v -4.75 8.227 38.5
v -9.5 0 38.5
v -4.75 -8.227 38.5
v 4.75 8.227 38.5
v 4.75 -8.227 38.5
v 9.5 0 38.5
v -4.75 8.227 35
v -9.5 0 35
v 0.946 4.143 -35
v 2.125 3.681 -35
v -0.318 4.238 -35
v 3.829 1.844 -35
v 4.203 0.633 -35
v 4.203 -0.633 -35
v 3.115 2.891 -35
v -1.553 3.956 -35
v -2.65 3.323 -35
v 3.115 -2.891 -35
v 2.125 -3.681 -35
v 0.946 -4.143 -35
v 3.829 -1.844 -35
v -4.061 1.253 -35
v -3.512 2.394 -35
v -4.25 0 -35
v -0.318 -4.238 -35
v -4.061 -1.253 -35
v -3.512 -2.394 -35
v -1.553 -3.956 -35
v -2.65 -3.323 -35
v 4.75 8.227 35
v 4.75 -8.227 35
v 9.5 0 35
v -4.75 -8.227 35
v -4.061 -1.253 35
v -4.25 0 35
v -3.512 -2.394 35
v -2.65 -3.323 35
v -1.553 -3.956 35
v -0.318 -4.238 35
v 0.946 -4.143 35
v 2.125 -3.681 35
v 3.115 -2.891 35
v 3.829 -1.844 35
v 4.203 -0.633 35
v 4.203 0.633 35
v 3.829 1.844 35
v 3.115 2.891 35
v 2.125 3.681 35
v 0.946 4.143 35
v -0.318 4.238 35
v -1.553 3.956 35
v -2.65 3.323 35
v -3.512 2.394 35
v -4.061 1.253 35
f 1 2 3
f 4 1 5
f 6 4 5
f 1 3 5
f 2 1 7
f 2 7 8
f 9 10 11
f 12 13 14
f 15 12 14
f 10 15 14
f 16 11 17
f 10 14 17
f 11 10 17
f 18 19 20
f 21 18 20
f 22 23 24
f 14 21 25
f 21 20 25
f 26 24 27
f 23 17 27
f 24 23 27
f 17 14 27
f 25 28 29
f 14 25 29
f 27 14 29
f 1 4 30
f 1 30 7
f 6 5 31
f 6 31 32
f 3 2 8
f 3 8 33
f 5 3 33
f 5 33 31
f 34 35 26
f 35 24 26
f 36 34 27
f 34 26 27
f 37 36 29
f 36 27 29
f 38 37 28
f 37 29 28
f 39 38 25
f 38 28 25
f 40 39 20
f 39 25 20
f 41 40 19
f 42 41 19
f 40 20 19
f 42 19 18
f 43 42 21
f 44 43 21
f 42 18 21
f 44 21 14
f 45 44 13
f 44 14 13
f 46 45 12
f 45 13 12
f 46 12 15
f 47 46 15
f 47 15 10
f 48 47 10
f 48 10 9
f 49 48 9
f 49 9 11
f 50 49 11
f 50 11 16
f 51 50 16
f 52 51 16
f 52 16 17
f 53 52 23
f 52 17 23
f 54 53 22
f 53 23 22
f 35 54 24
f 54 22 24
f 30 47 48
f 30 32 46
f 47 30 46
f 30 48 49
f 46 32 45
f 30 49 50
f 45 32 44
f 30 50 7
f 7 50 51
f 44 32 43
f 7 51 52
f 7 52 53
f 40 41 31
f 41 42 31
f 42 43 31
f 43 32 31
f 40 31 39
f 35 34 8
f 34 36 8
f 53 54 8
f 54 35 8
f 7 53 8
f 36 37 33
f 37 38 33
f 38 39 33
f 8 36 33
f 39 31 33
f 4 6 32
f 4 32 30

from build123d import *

# Parameters (mm, degrees)
F0_W     = 2
F0_H     = 3.5
F0_W_2   = 4.25
F0_H_2   = 36
F0_H_3   = 34
F3_DEPTH = 73.5


with BuildPart() as f1:
    # F0 (on Front) → F1 (revolve)
    with BuildSketch(Plane.XZ):
        Polygon((-4.25, 35), (0, 35), (0, 38.5), (-7.5, 38.5), (-7.5, 35), align=None)
        with Locations((-8.5, 36.75)):
            Rectangle(F0_W, F0_H)
        with Locations((-2.125, 17)):
            Rectangle(F0_W_2, F0_H_2)
        with Locations((-2.125, -18)):
            Rectangle(F0_W_2, F0_H_3)
    revolve(axis=Axis((0, 0, 36.75), (0, 0, 1)))

    # F2 (on face) → F3 (intersect, through all)
    with BuildSketch(Plane.XY.offset(38.5)):
        Polygon((4.75, -8.227241), (9.5, 0), (4.75, 8.227241), (-4.75, 8.227241), (-9.5, 0), (-4.75, -8.227241), align=None)
    extrude(amount=-F3_DEPTH, mode=Mode.INTERSECT)


solid = f1.part
